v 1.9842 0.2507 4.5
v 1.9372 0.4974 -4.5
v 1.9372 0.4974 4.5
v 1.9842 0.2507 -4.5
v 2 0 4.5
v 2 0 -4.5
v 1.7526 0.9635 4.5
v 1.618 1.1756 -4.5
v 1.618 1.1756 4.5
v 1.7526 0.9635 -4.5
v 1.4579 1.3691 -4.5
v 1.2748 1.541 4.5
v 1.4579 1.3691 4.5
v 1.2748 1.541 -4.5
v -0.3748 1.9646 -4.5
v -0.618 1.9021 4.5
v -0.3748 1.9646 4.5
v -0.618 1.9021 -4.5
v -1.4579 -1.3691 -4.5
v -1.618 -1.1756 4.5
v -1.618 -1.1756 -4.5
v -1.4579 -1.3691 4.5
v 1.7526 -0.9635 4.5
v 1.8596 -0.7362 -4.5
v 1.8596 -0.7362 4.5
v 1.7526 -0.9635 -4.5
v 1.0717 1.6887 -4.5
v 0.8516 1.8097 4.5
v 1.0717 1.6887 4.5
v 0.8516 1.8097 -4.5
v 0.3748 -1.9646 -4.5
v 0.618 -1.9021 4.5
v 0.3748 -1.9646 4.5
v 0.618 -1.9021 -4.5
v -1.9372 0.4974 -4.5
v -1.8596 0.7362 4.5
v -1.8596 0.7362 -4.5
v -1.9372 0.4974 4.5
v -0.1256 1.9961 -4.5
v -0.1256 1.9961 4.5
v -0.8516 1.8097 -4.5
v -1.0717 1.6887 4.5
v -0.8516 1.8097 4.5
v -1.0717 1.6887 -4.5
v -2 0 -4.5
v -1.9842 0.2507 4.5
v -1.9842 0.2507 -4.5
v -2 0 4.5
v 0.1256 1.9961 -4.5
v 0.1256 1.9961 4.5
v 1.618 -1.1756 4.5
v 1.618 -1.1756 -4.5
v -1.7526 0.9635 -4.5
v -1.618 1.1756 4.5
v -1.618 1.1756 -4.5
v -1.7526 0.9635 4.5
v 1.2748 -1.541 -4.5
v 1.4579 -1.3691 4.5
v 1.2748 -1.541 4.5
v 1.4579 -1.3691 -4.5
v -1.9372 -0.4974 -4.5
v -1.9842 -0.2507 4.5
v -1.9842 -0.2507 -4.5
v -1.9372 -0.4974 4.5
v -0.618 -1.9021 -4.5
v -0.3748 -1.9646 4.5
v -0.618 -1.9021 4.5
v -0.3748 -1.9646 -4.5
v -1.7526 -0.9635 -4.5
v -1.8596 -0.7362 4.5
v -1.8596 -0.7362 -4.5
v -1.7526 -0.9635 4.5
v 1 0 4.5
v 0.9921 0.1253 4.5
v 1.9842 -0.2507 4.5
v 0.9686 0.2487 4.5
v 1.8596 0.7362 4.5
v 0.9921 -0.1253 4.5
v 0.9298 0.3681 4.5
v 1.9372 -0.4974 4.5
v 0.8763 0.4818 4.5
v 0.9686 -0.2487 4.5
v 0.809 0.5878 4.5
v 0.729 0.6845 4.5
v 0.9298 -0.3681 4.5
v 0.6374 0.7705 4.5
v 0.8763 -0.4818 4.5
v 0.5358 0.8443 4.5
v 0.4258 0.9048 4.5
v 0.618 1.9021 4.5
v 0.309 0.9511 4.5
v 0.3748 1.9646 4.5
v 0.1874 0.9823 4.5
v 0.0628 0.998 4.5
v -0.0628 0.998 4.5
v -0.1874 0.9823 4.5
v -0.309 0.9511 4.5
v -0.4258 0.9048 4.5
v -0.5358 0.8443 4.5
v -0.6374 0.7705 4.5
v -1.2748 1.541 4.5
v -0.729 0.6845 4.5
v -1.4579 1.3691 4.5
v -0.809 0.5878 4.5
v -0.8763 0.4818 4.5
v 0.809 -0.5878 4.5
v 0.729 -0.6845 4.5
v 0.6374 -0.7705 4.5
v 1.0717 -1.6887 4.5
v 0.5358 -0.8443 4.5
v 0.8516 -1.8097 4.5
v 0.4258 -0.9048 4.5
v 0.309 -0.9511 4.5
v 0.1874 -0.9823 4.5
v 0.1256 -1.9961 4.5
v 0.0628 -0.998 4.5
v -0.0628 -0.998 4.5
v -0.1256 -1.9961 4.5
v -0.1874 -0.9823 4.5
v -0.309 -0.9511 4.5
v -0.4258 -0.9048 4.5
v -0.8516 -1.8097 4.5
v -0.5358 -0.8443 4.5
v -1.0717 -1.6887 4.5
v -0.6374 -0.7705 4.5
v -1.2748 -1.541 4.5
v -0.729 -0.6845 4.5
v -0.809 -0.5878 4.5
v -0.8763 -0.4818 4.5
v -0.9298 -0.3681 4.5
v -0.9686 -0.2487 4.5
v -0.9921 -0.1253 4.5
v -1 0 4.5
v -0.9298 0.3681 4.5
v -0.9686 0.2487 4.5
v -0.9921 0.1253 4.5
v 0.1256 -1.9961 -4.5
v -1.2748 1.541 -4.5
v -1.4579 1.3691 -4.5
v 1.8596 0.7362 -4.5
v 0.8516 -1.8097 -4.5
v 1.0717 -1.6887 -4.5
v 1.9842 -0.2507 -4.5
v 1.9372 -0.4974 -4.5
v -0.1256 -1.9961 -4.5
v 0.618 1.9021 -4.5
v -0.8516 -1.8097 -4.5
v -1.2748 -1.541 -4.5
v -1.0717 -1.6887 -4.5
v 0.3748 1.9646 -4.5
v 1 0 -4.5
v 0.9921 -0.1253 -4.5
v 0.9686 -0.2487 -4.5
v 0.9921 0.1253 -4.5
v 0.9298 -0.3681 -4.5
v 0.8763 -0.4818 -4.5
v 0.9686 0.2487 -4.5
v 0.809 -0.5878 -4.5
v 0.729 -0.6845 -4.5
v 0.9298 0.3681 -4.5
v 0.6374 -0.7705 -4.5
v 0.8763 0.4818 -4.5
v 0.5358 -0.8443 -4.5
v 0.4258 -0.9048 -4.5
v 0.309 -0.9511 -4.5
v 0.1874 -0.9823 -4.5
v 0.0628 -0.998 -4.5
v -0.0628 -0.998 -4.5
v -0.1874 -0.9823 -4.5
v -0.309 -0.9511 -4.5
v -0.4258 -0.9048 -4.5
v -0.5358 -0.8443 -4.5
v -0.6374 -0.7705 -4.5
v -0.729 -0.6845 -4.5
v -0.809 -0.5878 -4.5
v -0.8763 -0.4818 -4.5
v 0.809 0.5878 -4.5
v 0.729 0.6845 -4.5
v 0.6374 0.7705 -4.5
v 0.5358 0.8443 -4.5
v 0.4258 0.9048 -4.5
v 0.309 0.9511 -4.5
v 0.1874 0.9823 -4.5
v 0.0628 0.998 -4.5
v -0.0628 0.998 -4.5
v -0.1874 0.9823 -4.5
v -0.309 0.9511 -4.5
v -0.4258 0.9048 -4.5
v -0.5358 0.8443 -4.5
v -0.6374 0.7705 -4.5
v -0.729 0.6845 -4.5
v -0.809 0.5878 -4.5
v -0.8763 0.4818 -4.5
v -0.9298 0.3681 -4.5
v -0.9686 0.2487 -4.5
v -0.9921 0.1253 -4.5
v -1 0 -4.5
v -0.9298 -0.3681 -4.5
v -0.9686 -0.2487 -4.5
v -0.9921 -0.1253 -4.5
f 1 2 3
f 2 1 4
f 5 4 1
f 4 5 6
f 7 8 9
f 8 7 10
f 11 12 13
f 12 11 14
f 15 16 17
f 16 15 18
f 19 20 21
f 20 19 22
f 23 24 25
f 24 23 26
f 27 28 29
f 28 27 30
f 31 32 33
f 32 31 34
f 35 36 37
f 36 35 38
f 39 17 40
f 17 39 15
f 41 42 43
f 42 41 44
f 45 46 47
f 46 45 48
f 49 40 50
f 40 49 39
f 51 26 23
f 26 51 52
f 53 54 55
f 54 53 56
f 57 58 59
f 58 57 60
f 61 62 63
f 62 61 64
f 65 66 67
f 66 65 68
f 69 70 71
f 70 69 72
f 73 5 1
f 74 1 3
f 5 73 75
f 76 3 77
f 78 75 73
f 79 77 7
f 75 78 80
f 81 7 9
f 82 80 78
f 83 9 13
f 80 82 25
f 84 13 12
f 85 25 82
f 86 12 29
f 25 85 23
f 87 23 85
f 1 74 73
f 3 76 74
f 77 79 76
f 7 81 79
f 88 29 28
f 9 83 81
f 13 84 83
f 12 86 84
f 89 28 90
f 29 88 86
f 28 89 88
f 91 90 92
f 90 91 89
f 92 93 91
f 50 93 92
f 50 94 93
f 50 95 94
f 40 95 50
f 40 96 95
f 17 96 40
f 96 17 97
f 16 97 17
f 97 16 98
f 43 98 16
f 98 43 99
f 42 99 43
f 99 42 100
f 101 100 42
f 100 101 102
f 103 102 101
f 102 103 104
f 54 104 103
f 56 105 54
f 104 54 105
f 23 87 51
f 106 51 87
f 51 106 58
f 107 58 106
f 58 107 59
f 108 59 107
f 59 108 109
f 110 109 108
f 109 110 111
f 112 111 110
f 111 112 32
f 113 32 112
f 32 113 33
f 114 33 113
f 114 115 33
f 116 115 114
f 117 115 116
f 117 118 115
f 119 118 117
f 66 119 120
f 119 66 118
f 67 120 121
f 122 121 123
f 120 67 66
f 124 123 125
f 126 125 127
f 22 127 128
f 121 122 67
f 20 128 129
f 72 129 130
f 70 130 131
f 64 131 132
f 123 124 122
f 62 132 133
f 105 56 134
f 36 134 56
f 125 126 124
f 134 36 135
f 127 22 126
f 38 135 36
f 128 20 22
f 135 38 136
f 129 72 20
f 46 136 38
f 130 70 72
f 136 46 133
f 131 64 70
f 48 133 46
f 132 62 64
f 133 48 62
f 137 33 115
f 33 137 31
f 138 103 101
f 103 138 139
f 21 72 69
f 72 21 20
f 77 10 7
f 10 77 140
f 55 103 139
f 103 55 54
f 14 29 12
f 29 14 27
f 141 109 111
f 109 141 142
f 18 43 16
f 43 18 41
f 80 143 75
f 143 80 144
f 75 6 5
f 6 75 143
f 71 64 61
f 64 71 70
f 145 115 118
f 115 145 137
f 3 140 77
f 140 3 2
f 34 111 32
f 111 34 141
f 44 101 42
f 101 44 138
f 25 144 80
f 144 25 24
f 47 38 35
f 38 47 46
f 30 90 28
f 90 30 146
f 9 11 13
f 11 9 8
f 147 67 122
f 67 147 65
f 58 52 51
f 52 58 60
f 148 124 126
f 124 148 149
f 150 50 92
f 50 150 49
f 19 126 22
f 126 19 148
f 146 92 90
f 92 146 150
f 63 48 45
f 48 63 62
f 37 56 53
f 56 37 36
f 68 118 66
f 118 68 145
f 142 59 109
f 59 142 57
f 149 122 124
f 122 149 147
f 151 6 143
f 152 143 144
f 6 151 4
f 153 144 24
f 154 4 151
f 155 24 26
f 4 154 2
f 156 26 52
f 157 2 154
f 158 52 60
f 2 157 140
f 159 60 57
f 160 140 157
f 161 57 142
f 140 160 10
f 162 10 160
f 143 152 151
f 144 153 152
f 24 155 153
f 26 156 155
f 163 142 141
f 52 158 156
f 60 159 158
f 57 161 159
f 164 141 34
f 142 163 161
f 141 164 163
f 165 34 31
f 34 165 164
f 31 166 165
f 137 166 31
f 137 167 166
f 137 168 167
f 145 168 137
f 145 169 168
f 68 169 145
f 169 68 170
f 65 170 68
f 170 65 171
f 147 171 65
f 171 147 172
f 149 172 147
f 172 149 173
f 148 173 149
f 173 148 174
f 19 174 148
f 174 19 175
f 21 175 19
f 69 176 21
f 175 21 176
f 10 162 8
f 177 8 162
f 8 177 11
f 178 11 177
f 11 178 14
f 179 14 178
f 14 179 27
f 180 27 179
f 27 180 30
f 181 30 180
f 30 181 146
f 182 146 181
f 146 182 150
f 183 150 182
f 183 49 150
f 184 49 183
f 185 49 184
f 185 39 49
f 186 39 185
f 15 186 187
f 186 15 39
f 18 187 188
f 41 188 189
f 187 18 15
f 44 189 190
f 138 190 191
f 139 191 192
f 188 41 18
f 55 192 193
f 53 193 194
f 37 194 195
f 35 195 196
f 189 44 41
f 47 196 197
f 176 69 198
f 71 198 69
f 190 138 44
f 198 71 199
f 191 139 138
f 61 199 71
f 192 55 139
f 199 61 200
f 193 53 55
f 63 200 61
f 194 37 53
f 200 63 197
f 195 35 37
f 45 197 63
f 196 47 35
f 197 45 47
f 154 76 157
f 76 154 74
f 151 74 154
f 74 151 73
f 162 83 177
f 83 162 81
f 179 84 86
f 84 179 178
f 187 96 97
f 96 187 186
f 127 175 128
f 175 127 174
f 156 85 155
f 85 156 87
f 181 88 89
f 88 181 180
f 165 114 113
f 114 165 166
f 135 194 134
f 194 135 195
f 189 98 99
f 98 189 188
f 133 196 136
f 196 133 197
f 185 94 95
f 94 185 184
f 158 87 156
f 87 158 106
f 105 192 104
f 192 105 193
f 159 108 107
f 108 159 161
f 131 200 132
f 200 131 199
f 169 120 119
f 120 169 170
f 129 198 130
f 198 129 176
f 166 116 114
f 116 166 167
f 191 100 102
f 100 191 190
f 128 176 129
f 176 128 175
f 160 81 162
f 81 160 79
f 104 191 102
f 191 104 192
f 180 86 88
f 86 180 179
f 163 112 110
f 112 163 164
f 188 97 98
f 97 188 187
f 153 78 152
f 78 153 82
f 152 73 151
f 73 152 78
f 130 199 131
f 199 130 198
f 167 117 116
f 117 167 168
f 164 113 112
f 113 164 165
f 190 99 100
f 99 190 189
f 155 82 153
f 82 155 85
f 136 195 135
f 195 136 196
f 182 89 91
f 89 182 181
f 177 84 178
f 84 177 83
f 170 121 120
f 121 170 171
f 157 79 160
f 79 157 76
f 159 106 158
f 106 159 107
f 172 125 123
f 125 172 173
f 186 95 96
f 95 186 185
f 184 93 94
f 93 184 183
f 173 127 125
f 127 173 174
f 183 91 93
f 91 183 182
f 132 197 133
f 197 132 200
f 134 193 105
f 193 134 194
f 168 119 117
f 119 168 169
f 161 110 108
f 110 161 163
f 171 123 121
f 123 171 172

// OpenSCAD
$fn = 50;


difference() {
	union() {
		translate(v = [0, 0, -4.5000000000]) {
			cylinder(h = 9, r = 2.0000000000);
		}
	}
	union() {
		translate(v = [0, 0, -100.0000000000]) {
			cylinder(h = 200, r = 1.0000000000);
		}
	}
}
